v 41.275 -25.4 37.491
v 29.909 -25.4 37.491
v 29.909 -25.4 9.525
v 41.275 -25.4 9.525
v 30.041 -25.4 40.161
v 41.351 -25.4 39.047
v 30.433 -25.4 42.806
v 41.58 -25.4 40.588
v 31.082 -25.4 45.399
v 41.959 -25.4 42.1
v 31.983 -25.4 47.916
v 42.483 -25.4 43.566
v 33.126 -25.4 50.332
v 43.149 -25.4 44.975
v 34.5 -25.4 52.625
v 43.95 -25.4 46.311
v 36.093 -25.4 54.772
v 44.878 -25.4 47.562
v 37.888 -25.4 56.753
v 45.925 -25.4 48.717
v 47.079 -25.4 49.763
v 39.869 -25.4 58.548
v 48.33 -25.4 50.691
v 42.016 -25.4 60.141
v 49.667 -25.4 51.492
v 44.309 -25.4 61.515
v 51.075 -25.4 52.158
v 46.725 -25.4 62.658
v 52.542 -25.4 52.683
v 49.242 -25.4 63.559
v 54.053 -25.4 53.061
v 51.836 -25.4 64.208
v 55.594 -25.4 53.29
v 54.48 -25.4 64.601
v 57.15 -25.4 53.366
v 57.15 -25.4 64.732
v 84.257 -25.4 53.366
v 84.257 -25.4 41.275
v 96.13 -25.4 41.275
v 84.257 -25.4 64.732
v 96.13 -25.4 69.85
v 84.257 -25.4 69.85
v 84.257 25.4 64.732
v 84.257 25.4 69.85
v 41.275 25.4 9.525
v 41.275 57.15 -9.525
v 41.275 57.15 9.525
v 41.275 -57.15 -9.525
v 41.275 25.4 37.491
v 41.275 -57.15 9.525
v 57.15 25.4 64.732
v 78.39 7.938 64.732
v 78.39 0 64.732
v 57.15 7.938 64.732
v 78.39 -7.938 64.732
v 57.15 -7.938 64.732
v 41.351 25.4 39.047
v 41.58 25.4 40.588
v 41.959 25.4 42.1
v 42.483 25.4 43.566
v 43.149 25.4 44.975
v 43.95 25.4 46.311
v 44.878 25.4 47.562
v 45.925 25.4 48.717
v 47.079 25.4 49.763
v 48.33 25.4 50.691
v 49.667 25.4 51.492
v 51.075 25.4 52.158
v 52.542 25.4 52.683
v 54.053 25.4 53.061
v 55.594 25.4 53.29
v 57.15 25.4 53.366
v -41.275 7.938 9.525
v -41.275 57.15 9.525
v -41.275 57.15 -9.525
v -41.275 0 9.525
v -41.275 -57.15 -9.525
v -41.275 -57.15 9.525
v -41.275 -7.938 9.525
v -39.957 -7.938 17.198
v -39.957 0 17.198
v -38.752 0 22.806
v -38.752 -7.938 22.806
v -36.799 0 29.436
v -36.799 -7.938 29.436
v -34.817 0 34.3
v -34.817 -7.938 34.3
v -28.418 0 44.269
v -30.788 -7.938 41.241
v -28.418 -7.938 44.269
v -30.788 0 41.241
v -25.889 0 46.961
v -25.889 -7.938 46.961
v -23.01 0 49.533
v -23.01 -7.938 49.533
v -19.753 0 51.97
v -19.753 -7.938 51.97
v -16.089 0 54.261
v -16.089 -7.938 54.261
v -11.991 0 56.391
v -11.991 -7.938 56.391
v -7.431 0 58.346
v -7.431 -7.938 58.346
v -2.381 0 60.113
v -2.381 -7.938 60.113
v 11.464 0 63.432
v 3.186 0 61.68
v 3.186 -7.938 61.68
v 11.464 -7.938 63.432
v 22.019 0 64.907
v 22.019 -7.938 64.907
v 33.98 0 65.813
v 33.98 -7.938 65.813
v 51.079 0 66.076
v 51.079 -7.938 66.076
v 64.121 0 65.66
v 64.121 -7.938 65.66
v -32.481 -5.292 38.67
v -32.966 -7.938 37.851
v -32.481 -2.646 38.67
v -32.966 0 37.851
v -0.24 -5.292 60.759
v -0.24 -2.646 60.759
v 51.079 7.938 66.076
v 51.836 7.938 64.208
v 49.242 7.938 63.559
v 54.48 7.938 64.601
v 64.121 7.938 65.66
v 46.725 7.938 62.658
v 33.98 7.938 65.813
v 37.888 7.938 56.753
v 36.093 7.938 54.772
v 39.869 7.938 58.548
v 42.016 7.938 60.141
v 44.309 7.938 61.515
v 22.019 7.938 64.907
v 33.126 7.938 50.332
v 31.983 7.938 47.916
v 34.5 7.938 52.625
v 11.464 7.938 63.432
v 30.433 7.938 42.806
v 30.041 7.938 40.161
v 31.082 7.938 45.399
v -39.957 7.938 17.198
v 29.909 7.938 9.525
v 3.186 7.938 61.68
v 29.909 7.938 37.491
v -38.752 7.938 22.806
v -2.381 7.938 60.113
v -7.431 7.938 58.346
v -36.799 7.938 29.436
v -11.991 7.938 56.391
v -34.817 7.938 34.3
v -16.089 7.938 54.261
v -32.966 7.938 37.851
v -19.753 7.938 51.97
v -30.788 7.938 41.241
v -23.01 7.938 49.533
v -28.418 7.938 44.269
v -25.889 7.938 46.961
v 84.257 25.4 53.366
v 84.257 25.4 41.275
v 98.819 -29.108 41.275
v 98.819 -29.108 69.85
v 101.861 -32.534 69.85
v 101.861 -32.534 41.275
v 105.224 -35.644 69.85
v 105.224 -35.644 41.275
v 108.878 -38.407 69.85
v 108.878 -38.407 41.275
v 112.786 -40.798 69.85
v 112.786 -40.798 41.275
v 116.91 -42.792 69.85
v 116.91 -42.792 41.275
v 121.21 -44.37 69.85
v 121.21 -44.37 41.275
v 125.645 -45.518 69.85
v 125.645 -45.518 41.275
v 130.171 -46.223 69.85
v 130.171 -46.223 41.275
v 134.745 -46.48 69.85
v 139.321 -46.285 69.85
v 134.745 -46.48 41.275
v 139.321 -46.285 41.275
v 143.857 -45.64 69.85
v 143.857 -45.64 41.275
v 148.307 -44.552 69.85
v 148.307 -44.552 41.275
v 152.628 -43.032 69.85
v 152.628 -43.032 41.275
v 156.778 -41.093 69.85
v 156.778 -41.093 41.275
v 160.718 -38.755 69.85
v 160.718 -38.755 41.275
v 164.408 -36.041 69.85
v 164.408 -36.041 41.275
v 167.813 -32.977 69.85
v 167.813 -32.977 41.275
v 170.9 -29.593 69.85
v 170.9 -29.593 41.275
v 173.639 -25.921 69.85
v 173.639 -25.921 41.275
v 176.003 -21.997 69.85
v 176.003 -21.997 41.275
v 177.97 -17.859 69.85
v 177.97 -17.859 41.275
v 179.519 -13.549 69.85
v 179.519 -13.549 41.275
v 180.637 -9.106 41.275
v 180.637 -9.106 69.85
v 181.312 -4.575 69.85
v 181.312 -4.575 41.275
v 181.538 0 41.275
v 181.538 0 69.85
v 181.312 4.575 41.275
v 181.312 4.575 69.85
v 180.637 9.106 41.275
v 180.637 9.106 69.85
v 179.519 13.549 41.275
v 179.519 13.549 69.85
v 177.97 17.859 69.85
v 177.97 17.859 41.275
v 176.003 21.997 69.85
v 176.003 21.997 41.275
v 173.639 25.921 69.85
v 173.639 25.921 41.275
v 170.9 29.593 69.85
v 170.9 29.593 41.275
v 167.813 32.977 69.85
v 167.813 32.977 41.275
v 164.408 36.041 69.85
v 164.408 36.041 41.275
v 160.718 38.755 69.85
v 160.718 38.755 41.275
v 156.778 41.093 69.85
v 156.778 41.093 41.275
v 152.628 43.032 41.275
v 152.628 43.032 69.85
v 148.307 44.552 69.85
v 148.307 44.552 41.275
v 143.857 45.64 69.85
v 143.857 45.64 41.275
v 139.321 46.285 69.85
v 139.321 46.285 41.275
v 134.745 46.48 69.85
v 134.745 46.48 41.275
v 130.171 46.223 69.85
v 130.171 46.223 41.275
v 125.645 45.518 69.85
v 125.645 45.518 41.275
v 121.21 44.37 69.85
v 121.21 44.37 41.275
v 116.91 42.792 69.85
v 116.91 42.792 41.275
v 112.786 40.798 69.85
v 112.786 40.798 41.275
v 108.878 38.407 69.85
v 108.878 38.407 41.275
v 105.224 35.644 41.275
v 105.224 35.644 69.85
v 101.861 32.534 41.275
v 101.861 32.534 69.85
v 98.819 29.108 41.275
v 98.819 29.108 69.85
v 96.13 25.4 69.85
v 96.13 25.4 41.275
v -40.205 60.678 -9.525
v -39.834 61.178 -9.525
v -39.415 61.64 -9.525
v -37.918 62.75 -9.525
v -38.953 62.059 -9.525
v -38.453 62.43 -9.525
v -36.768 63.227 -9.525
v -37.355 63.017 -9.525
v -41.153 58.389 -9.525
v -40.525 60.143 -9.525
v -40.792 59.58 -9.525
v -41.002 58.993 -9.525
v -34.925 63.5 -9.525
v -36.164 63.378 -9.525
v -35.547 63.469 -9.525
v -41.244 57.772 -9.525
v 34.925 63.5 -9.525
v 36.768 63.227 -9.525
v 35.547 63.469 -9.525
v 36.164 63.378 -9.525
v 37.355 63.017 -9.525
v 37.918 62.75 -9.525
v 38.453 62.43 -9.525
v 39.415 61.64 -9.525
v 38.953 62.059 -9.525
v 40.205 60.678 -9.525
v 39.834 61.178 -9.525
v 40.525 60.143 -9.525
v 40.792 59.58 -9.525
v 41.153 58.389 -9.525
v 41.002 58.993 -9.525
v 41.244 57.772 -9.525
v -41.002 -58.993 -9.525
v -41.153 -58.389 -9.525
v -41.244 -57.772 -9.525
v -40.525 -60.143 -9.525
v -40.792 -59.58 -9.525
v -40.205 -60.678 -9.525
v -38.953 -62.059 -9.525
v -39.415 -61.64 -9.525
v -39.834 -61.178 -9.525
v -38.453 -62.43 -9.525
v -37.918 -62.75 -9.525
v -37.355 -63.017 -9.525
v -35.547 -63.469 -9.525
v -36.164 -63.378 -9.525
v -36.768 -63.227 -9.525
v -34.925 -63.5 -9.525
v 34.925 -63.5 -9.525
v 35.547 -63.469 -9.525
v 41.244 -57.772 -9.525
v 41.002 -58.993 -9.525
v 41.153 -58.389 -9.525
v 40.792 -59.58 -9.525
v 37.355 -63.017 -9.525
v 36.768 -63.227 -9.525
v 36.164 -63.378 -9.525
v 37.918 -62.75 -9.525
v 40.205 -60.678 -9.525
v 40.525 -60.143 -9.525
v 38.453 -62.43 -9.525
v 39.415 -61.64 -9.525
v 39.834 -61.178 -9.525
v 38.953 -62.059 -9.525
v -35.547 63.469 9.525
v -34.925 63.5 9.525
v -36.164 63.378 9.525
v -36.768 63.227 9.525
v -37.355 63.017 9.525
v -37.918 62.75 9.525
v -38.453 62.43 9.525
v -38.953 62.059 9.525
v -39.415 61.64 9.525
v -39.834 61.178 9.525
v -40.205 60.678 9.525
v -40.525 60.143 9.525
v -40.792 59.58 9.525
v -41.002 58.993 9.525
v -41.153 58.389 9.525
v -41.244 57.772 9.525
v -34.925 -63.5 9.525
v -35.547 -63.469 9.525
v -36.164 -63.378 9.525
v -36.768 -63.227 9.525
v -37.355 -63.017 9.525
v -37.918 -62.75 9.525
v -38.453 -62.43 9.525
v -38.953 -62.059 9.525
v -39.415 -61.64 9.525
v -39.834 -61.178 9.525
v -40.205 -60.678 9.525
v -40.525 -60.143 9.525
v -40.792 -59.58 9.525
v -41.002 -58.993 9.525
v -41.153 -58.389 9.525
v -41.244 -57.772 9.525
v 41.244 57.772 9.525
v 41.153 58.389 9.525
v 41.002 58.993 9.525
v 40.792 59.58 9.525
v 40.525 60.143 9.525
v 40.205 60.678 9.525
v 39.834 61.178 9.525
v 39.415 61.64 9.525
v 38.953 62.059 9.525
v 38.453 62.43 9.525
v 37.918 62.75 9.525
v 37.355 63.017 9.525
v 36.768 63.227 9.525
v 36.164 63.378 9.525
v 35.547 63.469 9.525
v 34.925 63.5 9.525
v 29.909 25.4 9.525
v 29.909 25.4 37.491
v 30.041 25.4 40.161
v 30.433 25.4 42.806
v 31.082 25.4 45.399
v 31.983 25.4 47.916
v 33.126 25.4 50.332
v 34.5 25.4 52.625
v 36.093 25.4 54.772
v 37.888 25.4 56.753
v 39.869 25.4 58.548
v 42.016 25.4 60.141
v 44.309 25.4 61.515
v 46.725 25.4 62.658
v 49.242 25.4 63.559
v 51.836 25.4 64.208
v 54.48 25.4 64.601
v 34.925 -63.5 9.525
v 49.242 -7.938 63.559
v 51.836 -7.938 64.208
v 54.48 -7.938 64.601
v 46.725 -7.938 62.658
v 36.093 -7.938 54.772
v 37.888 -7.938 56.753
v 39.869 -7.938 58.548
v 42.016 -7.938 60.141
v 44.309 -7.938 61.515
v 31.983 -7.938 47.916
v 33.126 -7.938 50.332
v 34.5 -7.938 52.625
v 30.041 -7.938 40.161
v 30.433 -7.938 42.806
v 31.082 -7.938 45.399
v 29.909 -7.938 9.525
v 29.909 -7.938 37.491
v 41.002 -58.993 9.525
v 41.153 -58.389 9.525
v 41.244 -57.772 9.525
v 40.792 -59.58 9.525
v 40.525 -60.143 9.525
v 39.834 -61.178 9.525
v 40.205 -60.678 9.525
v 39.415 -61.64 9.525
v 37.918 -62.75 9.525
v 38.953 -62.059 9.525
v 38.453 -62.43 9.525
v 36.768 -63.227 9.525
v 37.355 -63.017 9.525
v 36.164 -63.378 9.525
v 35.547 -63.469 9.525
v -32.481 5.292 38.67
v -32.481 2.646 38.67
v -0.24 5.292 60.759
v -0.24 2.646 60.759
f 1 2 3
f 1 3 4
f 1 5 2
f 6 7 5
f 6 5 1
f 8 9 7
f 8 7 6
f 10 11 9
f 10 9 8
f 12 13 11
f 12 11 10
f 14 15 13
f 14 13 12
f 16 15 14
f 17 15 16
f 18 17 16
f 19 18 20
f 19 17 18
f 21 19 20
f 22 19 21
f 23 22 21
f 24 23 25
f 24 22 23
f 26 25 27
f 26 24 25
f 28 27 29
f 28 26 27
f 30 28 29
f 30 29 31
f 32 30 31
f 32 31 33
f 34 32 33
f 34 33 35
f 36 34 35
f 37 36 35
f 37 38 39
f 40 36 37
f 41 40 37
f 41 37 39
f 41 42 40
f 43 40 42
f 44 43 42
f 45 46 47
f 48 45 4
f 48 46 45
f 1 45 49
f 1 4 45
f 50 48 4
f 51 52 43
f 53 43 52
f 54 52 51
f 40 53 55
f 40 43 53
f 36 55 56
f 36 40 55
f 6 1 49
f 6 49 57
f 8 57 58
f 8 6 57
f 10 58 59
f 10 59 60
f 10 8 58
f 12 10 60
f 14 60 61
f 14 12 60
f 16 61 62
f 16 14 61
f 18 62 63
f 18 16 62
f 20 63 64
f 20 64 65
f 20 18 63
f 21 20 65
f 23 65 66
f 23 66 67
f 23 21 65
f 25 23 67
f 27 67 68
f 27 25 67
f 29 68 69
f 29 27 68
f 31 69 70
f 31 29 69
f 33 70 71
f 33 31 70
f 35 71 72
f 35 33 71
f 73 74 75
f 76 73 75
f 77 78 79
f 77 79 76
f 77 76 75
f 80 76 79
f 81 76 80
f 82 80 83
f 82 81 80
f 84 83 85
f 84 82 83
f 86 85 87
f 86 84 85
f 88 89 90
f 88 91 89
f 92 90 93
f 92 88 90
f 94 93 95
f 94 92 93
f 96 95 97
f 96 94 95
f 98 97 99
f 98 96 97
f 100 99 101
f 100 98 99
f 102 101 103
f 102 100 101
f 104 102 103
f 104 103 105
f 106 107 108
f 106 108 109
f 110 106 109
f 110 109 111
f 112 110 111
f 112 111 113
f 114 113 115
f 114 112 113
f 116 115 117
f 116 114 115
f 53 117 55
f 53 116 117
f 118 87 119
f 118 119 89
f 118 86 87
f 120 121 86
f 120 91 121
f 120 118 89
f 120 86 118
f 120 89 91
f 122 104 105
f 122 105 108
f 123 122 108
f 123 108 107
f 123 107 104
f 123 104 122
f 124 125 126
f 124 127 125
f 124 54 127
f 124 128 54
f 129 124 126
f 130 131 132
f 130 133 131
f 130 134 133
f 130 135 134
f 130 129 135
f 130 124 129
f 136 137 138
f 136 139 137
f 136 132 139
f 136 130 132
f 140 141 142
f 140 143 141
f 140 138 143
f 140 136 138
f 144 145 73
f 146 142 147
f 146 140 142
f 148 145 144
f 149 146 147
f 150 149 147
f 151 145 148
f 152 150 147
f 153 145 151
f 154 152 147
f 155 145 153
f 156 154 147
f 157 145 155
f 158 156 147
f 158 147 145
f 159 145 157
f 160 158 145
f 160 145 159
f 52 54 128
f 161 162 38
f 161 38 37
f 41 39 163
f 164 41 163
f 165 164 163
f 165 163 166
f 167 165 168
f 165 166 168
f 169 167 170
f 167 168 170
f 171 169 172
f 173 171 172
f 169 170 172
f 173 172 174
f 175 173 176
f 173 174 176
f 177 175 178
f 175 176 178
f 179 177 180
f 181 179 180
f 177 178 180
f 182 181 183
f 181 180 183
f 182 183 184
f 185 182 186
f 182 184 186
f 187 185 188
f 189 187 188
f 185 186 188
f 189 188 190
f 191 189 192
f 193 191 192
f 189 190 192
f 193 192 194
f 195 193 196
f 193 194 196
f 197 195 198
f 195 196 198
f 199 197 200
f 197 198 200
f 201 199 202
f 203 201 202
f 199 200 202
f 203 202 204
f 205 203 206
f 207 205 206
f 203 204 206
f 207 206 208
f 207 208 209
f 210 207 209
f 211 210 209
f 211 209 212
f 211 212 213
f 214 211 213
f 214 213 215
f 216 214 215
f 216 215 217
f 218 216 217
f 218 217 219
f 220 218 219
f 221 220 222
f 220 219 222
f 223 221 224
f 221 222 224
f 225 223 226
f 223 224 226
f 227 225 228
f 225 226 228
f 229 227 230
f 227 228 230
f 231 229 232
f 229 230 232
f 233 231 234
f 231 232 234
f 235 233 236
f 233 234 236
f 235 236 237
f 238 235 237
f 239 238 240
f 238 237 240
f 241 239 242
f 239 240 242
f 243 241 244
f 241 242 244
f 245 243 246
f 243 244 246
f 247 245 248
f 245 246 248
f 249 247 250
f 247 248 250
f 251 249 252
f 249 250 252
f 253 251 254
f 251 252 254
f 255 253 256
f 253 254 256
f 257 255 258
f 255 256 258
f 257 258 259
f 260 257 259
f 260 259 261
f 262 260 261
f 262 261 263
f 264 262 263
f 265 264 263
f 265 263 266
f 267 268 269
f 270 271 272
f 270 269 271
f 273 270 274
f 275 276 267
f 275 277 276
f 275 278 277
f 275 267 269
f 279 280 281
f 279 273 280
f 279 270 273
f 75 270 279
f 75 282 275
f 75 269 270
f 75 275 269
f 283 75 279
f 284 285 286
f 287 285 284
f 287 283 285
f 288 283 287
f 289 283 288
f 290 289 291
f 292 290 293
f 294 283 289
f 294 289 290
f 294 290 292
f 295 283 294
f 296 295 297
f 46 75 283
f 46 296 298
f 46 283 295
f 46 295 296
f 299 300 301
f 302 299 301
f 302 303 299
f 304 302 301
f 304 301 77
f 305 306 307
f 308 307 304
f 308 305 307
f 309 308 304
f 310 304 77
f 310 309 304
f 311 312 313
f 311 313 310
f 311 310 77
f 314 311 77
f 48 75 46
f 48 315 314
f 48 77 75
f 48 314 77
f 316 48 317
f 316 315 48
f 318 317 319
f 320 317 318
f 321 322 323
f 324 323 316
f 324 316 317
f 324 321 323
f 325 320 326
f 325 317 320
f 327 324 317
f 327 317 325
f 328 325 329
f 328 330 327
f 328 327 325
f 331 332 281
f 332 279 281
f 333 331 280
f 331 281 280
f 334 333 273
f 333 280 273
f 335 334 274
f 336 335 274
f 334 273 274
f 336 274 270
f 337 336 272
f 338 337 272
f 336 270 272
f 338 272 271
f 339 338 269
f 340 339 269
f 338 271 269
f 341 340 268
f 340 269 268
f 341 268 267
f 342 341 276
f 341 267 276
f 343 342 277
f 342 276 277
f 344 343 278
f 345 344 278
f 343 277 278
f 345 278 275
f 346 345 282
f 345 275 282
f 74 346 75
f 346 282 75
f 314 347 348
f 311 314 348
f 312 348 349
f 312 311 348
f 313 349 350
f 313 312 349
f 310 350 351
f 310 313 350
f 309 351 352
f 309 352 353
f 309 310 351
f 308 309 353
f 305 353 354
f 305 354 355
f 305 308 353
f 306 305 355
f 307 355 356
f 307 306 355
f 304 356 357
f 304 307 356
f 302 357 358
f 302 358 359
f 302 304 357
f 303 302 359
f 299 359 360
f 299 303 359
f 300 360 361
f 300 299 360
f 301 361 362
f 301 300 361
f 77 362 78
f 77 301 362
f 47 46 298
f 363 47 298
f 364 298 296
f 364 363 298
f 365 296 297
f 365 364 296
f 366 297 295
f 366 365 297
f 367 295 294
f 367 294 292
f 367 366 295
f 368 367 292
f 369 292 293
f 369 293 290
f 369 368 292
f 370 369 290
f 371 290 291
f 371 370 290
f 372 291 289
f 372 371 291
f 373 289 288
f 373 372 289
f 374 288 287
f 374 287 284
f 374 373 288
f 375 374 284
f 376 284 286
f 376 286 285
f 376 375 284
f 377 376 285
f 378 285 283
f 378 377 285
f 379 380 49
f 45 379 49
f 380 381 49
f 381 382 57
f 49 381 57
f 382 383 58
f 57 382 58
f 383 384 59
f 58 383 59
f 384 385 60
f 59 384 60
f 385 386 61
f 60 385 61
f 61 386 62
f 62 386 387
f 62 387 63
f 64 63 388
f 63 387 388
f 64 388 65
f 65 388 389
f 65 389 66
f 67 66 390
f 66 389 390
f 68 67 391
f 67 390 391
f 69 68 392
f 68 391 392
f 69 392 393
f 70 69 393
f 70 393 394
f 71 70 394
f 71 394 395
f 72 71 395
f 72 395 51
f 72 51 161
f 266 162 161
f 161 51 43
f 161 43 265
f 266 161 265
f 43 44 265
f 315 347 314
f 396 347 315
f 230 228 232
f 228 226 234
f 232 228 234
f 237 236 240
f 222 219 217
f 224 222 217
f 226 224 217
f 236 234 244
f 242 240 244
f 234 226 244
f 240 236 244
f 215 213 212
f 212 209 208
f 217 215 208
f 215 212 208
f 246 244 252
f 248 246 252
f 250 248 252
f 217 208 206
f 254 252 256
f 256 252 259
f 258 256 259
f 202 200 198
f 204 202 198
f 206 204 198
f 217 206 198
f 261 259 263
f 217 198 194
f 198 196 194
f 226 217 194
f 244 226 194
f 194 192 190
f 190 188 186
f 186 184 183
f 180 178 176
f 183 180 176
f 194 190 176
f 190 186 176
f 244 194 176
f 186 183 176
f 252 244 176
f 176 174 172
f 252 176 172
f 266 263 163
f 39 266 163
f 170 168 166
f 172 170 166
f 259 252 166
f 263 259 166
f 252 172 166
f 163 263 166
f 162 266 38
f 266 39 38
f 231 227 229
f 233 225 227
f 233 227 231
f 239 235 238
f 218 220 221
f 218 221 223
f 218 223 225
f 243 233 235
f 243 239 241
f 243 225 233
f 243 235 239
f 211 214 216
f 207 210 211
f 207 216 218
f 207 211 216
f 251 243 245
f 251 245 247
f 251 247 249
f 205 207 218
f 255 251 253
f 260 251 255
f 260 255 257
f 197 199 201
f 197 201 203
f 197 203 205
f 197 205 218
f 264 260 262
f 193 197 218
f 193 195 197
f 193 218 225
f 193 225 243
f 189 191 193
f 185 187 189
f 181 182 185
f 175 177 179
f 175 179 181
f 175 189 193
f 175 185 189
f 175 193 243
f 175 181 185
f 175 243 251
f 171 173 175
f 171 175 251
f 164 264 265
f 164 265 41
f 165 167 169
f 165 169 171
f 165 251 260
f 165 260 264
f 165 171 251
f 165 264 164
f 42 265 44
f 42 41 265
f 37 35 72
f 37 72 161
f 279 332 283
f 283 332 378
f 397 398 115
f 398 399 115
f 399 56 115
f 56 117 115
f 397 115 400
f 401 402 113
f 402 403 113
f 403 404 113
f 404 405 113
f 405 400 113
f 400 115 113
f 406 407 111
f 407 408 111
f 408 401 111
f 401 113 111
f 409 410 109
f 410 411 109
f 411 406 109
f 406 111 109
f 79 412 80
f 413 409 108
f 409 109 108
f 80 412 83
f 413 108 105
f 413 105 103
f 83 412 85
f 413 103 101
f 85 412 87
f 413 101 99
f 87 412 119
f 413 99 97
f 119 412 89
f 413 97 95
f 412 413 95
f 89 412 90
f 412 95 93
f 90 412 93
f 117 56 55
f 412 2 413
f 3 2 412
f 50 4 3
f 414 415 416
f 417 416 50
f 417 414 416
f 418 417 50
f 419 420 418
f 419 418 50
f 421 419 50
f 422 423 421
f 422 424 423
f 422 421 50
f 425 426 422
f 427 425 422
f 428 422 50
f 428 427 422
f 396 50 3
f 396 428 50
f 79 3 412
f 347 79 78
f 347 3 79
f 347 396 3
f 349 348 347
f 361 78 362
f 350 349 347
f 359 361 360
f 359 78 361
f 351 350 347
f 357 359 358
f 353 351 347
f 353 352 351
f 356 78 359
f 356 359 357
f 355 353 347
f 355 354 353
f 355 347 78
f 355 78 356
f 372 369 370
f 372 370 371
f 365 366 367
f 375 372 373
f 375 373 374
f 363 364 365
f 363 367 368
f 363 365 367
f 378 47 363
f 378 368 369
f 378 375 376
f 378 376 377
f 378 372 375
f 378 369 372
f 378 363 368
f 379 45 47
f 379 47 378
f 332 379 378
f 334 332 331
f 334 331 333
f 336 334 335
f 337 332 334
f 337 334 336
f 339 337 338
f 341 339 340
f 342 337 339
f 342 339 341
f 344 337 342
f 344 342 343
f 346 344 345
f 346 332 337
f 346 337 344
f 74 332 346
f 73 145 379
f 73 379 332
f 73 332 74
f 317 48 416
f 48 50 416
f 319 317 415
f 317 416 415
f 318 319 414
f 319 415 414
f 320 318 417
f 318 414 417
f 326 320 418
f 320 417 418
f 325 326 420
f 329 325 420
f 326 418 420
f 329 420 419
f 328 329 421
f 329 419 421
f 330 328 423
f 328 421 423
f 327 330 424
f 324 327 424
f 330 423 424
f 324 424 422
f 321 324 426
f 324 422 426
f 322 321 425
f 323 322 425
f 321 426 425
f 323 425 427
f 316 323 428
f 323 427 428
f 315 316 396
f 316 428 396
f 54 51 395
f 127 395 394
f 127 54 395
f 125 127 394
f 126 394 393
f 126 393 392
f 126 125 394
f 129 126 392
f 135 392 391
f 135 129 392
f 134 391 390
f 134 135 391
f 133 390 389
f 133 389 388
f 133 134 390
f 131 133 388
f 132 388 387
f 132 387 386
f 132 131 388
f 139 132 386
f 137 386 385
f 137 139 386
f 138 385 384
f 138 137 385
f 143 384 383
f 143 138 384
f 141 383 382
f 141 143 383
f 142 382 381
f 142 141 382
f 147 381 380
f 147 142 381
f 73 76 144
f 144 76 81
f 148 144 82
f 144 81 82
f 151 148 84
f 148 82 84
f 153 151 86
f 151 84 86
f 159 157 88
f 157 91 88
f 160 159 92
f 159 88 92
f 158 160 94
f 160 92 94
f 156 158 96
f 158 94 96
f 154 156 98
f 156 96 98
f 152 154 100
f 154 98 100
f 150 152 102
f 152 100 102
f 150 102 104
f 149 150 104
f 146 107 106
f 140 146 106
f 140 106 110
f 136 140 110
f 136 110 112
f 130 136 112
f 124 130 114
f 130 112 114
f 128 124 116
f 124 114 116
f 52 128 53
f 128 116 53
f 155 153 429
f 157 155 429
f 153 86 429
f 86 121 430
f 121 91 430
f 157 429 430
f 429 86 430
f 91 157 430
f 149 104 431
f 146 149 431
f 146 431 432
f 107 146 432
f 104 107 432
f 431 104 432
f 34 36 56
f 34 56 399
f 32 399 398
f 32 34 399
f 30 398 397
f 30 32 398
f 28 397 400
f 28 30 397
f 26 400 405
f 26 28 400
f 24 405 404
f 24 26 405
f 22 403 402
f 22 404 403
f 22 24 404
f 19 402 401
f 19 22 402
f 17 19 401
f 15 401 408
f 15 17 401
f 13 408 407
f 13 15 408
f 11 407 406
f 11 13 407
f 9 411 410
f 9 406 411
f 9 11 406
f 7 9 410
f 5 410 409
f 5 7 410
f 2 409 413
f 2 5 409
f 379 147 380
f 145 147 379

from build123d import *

# Parameters (mm, degrees)
F1_DEPTH = 63.5
F0_W     = 4.3192696064
F0_H     = 12.0912648122
F0_H_2   = 11.3655438513
F0_H_3   = 5.1181913365
F2_DEPTH = 25.4
F3_DEPTH = 7.9375
F5_R     = 6.35


with BuildPart() as f1:
    # F0 (on Front) → F1 (new body, symmetric)
    with BuildSketch(Plane.XZ):
        Polygon((-41.275, -9.525), (41.275, -9.525), (41.275, 9.525), (29.9094561487, 9.525), (-41.275, 9.525), align=None)
    extrude(amount=F1_DEPTH, both=True)

    # F0 (on Front) → F2 (join, symmetric)
    with BuildSketch(Plane.XZ):
        with BuildLine():
            Line((29.9094561487, 9.525), (41.275, 9.525))
            Line((41.275, 9.525), (41.275, 37.4912648122))
            ThreePointArc((41.275, 37.4912648122), (45.9246798487, 48.7165849636), (57.15, 53.3662648122))
            Line((57.15, 53.3662648122), (84.2568697843, 53.3662648122))
            Line((84.2568697843, 53.3662648122), (84.2568697843, 64.7318086635))
            Line((84.2568697843, 64.7318086635), (78.3901438117, 64.7318086635))
            Line((78.3901438117, 64.7318086635), (57.15, 64.7318086635))
            ThreePointArc((57.15, 64.7318086635), (37.8880267196, 56.7532380926), (29.9094561487, 37.4912648122))
            Line((29.9094561487, 37.4912648122), (29.9094561487, 9.525))
        make_face()
        with Locations((86.4165045875, 47.3206324061)):
            Rectangle(F0_W, F0_H)
        with Locations((86.4165045875, 59.0490367378)):
            Rectangle(F0_W, F0_H_2)
        with Locations((86.4165045875, 67.2909043317)):
            Rectangle(F0_W, F0_H_3)
        Polygon((88.5761393907, 69.85), (88.5761393907, 64.7318086635), (88.5761393907, 53.3662648122), (88.5761393907, 41.275), (135.0568697843, 41.275), (135.0568697843, 69.85), align=None)
    extrude(amount=F2_DEPTH, both=True)

    # F0 (on Front) → F3 (join, symmetric)
    with BuildSketch(Plane.XZ):
        with BuildLine():
            add(Edge.make_bspline(
                [(-41.275, 9.525), (-36.5560054779, 38.5108739138), (-31.082380563, 73.5029876232), (78.3901438117, 64.7318086635)],
                knots=[0, 0, 0, 0, 131.7859566353, 131.7859566353, 131.7859566353, 131.7859566353], degree=3))
            Line((-41.275, 9.525), (29.9094561487, 9.525))
            Line((29.9094561487, 9.525), (29.9094561487, 37.4912648122))
            ThreePointArc((29.9094561487, 37.4912648122), (37.8880267196, 56.7532380926), (57.15, 64.7318086635))
            Line((57.15, 64.7318086635), (78.3901438117, 64.7318086635))
        make_face()
    extrude(amount=F3_DEPTH, both=True)

    # F0 (on Front) → F4 (revolve)
    with BuildSketch(Plane.XZ):
        Polygon((88.5761393907, 69.85), (88.5761393907, 64.7318086635), (88.5761393907, 53.3662648122), (88.5761393907, 41.275), (135.0568697843, 41.275), (135.0568697843, 69.85), align=None)
    revolve(axis=Axis((135.0568697843, 0, 55.5625), (0, 0, 1)))

    # F5
    f5_edges = [f1.edges().sort_by_distance(p)[0] for p in [
        (41.275, -63.5, 0),
        (-41.275, -63.5, 0),
        (41.275, 63.5, 0),
        (-41.275, 63.5, 0),
    ]]
    fillet(f5_edges, radius=F5_R)


solid = f1.part
